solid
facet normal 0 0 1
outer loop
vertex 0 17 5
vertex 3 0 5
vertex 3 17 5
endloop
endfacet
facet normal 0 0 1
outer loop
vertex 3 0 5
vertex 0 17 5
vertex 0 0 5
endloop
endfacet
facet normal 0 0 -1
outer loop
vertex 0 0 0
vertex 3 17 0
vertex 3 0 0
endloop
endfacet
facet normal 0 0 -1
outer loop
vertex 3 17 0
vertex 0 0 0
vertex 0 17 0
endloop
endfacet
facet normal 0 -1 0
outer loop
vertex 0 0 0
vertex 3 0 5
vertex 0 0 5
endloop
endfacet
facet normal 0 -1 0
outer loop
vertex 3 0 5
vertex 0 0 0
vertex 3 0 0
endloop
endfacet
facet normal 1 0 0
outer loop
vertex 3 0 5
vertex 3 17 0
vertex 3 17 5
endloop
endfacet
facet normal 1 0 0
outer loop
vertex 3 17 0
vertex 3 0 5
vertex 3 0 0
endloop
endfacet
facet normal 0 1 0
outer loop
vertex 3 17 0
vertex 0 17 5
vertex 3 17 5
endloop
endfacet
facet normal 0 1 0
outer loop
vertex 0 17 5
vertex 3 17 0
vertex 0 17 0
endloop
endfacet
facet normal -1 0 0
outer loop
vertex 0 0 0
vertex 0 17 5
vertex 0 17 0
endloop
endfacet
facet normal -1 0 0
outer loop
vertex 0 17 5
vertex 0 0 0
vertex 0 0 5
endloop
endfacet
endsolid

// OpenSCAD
// Generated by SolidPython 1.0.1 on 2020-07-29 00:46:54


cube(size = [3, 17, 5]);
/***********************************************
*********      SolidPython code:      **********
************************************************
 
# import packages: SolidPython
from solid import *
from solid.utils import *
from itertools import chain, combinations, permutations


class Resize:

    def __init__(self, scad_file):
        self.scad_file = scad_file
        #self.scad_file = import_scad(scad_file)
        # cone/cylinder param:
        self.r1 = 0
        self.r2 = 0
        self.h = 0
        # rectangular prism param:
        self.w = 0
        self.l = 0
        # ellipse param:
        self.r = 0

    # import OpenScad code (file name corresponds to shape)


    # classify shape + parameters
    def assign(self, param1, param2, param3):
        if self.scad_file == 'cone.scad':
            self.r1 = param1
            self.r2 = param2
            self.h = param3
        elif self.scad_file == 'cylinder.scad':
            self.r1 = param1
            self.r2 = param2
            self.h = param3
        elif self.scad_file == 'rectangularPrism.scad':
            self.h = param1
            self.l = param2
            self.w = param3
        else:
            self.r = param1
            self.h = param2

    # resize parameters
    def iterate(self):
        x = range(3, 20, 2)
        i = 1
        if self.scad_file == 'cone.scad':
            tempList = list(permutations(x, 2))
            for temp in tempList:
                param1 = temp[0]
                param2 = temp[1]
                filepath = 'produced_scad_files/' + 'cone' + str(param1) + '_' + str(param2) + '_' + '.scad'
                scad_render_to_file(cylinder(h=param1, r1=param2, r2=0), filepath)

        elif self.scad_file == 'cylinder.scad':
            tempList = list(permutations(x, 3))
            for temp in tempList:
                param1 = temp[0]
                param2 = temp[1]
                filepath = 'produced_scad_files/' + 'cylinder' + str(param1) + '_' + str(param2) + '_' + '.scad'
                scad_render_to_file(cylinder(h=param1, r1=param2, r2=param2), filepath)

        elif self.scad_file == 'rectangularPrism.scad':
            tempList = list(permutations(x, 3))
            for temp in tempList:
                param1 = temp[0]
                param2 = temp[1]
                param3 = temp[2]
                filepath = 'produced_scad_files/' + 'rectangularPrism' + str(param1) + '_' + str(param2) + '_' + str(
                    param3) + '.scad'
                scad_render_to_file(cube(size=(param1, param2, param3)), filepath)

        elif self.scad_file == 'ellipse.scad':
            tempList = list(permutations(x, 4))
            for temp in tempList:
                param1 = temp[0]
                param2 = temp[1]
                param3 = temp[2]
                param4 = temp[3]
                filepath = 'produced_scad_files/' + 'ellipse' + str(param1) + '_' + str(param2) + '_' + str(param3) + '_' + str(param4) + '.scad'
                scad_render_to_file(scale([param1, param2, param3])(sphere(r=param4)), filepath)

    def render_to_scadfile(self):
        scad_render_to_file(scad, 'example.scad') 
 
************************************************/
